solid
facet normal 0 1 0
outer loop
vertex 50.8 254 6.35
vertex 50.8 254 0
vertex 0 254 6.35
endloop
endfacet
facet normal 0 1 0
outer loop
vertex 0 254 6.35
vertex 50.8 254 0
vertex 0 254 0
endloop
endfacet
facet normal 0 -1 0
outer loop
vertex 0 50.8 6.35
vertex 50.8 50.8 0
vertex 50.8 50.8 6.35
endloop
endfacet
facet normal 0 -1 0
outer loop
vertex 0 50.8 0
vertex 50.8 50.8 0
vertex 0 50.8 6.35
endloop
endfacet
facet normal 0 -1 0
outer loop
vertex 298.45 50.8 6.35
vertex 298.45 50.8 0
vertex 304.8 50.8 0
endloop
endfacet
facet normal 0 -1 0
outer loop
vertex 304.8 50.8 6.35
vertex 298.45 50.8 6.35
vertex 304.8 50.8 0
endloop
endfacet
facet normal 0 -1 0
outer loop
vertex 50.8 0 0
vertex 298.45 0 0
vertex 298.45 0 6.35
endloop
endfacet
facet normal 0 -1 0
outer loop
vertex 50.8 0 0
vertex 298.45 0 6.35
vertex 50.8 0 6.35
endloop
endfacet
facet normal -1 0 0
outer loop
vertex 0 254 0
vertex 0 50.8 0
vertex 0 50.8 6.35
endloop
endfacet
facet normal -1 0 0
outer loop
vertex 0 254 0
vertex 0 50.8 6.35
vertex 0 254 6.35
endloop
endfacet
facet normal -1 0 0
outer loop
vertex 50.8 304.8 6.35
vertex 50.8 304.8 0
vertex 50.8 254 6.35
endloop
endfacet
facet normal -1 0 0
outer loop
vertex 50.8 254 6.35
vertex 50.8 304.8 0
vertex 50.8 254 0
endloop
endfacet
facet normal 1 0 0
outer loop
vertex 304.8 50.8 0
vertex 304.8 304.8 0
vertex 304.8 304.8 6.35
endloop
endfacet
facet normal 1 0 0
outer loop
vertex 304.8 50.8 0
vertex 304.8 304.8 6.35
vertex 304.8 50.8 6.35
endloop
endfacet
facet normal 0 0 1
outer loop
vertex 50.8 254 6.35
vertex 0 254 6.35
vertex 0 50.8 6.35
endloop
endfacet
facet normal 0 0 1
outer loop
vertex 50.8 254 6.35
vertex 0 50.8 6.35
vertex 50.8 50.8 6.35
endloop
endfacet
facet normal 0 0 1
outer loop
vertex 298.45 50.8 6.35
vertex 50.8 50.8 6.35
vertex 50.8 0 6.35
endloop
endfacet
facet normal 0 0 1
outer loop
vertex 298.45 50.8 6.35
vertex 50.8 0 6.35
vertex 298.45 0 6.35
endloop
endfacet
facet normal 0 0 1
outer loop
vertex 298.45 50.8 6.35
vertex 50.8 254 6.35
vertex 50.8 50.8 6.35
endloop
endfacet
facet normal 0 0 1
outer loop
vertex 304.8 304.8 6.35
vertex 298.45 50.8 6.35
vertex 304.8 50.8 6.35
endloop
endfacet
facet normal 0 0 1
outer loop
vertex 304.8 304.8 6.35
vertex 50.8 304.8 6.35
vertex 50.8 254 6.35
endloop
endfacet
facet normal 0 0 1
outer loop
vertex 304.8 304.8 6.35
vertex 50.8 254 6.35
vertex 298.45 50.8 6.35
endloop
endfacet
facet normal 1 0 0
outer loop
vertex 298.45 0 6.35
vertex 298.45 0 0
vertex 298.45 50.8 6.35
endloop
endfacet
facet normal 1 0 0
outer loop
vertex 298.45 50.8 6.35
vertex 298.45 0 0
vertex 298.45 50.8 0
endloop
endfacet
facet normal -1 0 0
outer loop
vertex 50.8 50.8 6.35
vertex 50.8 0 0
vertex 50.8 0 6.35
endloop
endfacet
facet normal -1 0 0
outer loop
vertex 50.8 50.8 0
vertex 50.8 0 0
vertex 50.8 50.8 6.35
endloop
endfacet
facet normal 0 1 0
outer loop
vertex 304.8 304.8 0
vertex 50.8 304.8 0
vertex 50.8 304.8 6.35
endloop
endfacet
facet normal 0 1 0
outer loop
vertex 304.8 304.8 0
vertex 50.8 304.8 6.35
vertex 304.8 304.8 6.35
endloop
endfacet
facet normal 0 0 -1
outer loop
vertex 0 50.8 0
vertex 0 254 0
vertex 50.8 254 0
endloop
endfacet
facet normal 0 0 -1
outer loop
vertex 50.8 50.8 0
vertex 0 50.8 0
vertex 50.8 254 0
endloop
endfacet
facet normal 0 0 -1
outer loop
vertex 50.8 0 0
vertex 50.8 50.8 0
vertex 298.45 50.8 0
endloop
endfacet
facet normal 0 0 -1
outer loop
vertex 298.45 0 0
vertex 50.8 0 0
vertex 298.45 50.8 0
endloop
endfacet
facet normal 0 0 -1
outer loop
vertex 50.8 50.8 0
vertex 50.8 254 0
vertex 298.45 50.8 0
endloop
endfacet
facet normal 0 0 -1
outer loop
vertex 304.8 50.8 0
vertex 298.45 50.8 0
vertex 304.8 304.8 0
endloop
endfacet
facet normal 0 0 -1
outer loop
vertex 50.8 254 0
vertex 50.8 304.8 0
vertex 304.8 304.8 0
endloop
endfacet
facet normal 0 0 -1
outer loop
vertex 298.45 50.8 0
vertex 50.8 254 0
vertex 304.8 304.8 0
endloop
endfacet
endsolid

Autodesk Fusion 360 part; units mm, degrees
sketch "Sketch1" plane through (0, 0, 0) normal (0, 0, 1) x (1, 0, 0)
  line L0 (0, 0) -> (0, 304.8)
  line L1 (0, 304.8) -> (304.8, 304.8)
  line L2 (304.8, 304.8) -> (304.8, 0)
  line L3 (304.8, 0) -> (0, 0)
  line L4 (0, 0) -> (50.8, 0)
  line L5 (50.8, 0) -> (50.8, 50.8)
  line L6 (50.8, 50.8) -> (0, 50.8)
  line L7 (0, 50.8) -> (0, 0)
  line L8 (0, 304.8) -> (50.8, 304.8)
  line L9 (50.8, 304.8) -> (50.8, 254)
  line L10 (50.8, 254) -> (0, 254)
  line L11 (0, 254) -> (0, 304.8)
  line L12 (304.8, 0) -> (298.45, 0)
  line L13 (298.45, 0) -> (298.45, 50.8)
  line L14 (298.45, 50.8) -> (304.8, 50.8)
  line L15 (304.8, 50.8) -> (304.8, 0)
  dimension "d2" = 304.8
  dimension "d3" = 304.8
  dimension "d10" = 50.8
  dimension "d13" = 50.8
  dimension "d14" = 6.35
  dimension "d17" = 50.8
extrude "Extrude1" add sketch "Sketch1" along normal blind 6.35 contours L0 L1 L2 L3 L5 L6 L9 L10 L13 L14
